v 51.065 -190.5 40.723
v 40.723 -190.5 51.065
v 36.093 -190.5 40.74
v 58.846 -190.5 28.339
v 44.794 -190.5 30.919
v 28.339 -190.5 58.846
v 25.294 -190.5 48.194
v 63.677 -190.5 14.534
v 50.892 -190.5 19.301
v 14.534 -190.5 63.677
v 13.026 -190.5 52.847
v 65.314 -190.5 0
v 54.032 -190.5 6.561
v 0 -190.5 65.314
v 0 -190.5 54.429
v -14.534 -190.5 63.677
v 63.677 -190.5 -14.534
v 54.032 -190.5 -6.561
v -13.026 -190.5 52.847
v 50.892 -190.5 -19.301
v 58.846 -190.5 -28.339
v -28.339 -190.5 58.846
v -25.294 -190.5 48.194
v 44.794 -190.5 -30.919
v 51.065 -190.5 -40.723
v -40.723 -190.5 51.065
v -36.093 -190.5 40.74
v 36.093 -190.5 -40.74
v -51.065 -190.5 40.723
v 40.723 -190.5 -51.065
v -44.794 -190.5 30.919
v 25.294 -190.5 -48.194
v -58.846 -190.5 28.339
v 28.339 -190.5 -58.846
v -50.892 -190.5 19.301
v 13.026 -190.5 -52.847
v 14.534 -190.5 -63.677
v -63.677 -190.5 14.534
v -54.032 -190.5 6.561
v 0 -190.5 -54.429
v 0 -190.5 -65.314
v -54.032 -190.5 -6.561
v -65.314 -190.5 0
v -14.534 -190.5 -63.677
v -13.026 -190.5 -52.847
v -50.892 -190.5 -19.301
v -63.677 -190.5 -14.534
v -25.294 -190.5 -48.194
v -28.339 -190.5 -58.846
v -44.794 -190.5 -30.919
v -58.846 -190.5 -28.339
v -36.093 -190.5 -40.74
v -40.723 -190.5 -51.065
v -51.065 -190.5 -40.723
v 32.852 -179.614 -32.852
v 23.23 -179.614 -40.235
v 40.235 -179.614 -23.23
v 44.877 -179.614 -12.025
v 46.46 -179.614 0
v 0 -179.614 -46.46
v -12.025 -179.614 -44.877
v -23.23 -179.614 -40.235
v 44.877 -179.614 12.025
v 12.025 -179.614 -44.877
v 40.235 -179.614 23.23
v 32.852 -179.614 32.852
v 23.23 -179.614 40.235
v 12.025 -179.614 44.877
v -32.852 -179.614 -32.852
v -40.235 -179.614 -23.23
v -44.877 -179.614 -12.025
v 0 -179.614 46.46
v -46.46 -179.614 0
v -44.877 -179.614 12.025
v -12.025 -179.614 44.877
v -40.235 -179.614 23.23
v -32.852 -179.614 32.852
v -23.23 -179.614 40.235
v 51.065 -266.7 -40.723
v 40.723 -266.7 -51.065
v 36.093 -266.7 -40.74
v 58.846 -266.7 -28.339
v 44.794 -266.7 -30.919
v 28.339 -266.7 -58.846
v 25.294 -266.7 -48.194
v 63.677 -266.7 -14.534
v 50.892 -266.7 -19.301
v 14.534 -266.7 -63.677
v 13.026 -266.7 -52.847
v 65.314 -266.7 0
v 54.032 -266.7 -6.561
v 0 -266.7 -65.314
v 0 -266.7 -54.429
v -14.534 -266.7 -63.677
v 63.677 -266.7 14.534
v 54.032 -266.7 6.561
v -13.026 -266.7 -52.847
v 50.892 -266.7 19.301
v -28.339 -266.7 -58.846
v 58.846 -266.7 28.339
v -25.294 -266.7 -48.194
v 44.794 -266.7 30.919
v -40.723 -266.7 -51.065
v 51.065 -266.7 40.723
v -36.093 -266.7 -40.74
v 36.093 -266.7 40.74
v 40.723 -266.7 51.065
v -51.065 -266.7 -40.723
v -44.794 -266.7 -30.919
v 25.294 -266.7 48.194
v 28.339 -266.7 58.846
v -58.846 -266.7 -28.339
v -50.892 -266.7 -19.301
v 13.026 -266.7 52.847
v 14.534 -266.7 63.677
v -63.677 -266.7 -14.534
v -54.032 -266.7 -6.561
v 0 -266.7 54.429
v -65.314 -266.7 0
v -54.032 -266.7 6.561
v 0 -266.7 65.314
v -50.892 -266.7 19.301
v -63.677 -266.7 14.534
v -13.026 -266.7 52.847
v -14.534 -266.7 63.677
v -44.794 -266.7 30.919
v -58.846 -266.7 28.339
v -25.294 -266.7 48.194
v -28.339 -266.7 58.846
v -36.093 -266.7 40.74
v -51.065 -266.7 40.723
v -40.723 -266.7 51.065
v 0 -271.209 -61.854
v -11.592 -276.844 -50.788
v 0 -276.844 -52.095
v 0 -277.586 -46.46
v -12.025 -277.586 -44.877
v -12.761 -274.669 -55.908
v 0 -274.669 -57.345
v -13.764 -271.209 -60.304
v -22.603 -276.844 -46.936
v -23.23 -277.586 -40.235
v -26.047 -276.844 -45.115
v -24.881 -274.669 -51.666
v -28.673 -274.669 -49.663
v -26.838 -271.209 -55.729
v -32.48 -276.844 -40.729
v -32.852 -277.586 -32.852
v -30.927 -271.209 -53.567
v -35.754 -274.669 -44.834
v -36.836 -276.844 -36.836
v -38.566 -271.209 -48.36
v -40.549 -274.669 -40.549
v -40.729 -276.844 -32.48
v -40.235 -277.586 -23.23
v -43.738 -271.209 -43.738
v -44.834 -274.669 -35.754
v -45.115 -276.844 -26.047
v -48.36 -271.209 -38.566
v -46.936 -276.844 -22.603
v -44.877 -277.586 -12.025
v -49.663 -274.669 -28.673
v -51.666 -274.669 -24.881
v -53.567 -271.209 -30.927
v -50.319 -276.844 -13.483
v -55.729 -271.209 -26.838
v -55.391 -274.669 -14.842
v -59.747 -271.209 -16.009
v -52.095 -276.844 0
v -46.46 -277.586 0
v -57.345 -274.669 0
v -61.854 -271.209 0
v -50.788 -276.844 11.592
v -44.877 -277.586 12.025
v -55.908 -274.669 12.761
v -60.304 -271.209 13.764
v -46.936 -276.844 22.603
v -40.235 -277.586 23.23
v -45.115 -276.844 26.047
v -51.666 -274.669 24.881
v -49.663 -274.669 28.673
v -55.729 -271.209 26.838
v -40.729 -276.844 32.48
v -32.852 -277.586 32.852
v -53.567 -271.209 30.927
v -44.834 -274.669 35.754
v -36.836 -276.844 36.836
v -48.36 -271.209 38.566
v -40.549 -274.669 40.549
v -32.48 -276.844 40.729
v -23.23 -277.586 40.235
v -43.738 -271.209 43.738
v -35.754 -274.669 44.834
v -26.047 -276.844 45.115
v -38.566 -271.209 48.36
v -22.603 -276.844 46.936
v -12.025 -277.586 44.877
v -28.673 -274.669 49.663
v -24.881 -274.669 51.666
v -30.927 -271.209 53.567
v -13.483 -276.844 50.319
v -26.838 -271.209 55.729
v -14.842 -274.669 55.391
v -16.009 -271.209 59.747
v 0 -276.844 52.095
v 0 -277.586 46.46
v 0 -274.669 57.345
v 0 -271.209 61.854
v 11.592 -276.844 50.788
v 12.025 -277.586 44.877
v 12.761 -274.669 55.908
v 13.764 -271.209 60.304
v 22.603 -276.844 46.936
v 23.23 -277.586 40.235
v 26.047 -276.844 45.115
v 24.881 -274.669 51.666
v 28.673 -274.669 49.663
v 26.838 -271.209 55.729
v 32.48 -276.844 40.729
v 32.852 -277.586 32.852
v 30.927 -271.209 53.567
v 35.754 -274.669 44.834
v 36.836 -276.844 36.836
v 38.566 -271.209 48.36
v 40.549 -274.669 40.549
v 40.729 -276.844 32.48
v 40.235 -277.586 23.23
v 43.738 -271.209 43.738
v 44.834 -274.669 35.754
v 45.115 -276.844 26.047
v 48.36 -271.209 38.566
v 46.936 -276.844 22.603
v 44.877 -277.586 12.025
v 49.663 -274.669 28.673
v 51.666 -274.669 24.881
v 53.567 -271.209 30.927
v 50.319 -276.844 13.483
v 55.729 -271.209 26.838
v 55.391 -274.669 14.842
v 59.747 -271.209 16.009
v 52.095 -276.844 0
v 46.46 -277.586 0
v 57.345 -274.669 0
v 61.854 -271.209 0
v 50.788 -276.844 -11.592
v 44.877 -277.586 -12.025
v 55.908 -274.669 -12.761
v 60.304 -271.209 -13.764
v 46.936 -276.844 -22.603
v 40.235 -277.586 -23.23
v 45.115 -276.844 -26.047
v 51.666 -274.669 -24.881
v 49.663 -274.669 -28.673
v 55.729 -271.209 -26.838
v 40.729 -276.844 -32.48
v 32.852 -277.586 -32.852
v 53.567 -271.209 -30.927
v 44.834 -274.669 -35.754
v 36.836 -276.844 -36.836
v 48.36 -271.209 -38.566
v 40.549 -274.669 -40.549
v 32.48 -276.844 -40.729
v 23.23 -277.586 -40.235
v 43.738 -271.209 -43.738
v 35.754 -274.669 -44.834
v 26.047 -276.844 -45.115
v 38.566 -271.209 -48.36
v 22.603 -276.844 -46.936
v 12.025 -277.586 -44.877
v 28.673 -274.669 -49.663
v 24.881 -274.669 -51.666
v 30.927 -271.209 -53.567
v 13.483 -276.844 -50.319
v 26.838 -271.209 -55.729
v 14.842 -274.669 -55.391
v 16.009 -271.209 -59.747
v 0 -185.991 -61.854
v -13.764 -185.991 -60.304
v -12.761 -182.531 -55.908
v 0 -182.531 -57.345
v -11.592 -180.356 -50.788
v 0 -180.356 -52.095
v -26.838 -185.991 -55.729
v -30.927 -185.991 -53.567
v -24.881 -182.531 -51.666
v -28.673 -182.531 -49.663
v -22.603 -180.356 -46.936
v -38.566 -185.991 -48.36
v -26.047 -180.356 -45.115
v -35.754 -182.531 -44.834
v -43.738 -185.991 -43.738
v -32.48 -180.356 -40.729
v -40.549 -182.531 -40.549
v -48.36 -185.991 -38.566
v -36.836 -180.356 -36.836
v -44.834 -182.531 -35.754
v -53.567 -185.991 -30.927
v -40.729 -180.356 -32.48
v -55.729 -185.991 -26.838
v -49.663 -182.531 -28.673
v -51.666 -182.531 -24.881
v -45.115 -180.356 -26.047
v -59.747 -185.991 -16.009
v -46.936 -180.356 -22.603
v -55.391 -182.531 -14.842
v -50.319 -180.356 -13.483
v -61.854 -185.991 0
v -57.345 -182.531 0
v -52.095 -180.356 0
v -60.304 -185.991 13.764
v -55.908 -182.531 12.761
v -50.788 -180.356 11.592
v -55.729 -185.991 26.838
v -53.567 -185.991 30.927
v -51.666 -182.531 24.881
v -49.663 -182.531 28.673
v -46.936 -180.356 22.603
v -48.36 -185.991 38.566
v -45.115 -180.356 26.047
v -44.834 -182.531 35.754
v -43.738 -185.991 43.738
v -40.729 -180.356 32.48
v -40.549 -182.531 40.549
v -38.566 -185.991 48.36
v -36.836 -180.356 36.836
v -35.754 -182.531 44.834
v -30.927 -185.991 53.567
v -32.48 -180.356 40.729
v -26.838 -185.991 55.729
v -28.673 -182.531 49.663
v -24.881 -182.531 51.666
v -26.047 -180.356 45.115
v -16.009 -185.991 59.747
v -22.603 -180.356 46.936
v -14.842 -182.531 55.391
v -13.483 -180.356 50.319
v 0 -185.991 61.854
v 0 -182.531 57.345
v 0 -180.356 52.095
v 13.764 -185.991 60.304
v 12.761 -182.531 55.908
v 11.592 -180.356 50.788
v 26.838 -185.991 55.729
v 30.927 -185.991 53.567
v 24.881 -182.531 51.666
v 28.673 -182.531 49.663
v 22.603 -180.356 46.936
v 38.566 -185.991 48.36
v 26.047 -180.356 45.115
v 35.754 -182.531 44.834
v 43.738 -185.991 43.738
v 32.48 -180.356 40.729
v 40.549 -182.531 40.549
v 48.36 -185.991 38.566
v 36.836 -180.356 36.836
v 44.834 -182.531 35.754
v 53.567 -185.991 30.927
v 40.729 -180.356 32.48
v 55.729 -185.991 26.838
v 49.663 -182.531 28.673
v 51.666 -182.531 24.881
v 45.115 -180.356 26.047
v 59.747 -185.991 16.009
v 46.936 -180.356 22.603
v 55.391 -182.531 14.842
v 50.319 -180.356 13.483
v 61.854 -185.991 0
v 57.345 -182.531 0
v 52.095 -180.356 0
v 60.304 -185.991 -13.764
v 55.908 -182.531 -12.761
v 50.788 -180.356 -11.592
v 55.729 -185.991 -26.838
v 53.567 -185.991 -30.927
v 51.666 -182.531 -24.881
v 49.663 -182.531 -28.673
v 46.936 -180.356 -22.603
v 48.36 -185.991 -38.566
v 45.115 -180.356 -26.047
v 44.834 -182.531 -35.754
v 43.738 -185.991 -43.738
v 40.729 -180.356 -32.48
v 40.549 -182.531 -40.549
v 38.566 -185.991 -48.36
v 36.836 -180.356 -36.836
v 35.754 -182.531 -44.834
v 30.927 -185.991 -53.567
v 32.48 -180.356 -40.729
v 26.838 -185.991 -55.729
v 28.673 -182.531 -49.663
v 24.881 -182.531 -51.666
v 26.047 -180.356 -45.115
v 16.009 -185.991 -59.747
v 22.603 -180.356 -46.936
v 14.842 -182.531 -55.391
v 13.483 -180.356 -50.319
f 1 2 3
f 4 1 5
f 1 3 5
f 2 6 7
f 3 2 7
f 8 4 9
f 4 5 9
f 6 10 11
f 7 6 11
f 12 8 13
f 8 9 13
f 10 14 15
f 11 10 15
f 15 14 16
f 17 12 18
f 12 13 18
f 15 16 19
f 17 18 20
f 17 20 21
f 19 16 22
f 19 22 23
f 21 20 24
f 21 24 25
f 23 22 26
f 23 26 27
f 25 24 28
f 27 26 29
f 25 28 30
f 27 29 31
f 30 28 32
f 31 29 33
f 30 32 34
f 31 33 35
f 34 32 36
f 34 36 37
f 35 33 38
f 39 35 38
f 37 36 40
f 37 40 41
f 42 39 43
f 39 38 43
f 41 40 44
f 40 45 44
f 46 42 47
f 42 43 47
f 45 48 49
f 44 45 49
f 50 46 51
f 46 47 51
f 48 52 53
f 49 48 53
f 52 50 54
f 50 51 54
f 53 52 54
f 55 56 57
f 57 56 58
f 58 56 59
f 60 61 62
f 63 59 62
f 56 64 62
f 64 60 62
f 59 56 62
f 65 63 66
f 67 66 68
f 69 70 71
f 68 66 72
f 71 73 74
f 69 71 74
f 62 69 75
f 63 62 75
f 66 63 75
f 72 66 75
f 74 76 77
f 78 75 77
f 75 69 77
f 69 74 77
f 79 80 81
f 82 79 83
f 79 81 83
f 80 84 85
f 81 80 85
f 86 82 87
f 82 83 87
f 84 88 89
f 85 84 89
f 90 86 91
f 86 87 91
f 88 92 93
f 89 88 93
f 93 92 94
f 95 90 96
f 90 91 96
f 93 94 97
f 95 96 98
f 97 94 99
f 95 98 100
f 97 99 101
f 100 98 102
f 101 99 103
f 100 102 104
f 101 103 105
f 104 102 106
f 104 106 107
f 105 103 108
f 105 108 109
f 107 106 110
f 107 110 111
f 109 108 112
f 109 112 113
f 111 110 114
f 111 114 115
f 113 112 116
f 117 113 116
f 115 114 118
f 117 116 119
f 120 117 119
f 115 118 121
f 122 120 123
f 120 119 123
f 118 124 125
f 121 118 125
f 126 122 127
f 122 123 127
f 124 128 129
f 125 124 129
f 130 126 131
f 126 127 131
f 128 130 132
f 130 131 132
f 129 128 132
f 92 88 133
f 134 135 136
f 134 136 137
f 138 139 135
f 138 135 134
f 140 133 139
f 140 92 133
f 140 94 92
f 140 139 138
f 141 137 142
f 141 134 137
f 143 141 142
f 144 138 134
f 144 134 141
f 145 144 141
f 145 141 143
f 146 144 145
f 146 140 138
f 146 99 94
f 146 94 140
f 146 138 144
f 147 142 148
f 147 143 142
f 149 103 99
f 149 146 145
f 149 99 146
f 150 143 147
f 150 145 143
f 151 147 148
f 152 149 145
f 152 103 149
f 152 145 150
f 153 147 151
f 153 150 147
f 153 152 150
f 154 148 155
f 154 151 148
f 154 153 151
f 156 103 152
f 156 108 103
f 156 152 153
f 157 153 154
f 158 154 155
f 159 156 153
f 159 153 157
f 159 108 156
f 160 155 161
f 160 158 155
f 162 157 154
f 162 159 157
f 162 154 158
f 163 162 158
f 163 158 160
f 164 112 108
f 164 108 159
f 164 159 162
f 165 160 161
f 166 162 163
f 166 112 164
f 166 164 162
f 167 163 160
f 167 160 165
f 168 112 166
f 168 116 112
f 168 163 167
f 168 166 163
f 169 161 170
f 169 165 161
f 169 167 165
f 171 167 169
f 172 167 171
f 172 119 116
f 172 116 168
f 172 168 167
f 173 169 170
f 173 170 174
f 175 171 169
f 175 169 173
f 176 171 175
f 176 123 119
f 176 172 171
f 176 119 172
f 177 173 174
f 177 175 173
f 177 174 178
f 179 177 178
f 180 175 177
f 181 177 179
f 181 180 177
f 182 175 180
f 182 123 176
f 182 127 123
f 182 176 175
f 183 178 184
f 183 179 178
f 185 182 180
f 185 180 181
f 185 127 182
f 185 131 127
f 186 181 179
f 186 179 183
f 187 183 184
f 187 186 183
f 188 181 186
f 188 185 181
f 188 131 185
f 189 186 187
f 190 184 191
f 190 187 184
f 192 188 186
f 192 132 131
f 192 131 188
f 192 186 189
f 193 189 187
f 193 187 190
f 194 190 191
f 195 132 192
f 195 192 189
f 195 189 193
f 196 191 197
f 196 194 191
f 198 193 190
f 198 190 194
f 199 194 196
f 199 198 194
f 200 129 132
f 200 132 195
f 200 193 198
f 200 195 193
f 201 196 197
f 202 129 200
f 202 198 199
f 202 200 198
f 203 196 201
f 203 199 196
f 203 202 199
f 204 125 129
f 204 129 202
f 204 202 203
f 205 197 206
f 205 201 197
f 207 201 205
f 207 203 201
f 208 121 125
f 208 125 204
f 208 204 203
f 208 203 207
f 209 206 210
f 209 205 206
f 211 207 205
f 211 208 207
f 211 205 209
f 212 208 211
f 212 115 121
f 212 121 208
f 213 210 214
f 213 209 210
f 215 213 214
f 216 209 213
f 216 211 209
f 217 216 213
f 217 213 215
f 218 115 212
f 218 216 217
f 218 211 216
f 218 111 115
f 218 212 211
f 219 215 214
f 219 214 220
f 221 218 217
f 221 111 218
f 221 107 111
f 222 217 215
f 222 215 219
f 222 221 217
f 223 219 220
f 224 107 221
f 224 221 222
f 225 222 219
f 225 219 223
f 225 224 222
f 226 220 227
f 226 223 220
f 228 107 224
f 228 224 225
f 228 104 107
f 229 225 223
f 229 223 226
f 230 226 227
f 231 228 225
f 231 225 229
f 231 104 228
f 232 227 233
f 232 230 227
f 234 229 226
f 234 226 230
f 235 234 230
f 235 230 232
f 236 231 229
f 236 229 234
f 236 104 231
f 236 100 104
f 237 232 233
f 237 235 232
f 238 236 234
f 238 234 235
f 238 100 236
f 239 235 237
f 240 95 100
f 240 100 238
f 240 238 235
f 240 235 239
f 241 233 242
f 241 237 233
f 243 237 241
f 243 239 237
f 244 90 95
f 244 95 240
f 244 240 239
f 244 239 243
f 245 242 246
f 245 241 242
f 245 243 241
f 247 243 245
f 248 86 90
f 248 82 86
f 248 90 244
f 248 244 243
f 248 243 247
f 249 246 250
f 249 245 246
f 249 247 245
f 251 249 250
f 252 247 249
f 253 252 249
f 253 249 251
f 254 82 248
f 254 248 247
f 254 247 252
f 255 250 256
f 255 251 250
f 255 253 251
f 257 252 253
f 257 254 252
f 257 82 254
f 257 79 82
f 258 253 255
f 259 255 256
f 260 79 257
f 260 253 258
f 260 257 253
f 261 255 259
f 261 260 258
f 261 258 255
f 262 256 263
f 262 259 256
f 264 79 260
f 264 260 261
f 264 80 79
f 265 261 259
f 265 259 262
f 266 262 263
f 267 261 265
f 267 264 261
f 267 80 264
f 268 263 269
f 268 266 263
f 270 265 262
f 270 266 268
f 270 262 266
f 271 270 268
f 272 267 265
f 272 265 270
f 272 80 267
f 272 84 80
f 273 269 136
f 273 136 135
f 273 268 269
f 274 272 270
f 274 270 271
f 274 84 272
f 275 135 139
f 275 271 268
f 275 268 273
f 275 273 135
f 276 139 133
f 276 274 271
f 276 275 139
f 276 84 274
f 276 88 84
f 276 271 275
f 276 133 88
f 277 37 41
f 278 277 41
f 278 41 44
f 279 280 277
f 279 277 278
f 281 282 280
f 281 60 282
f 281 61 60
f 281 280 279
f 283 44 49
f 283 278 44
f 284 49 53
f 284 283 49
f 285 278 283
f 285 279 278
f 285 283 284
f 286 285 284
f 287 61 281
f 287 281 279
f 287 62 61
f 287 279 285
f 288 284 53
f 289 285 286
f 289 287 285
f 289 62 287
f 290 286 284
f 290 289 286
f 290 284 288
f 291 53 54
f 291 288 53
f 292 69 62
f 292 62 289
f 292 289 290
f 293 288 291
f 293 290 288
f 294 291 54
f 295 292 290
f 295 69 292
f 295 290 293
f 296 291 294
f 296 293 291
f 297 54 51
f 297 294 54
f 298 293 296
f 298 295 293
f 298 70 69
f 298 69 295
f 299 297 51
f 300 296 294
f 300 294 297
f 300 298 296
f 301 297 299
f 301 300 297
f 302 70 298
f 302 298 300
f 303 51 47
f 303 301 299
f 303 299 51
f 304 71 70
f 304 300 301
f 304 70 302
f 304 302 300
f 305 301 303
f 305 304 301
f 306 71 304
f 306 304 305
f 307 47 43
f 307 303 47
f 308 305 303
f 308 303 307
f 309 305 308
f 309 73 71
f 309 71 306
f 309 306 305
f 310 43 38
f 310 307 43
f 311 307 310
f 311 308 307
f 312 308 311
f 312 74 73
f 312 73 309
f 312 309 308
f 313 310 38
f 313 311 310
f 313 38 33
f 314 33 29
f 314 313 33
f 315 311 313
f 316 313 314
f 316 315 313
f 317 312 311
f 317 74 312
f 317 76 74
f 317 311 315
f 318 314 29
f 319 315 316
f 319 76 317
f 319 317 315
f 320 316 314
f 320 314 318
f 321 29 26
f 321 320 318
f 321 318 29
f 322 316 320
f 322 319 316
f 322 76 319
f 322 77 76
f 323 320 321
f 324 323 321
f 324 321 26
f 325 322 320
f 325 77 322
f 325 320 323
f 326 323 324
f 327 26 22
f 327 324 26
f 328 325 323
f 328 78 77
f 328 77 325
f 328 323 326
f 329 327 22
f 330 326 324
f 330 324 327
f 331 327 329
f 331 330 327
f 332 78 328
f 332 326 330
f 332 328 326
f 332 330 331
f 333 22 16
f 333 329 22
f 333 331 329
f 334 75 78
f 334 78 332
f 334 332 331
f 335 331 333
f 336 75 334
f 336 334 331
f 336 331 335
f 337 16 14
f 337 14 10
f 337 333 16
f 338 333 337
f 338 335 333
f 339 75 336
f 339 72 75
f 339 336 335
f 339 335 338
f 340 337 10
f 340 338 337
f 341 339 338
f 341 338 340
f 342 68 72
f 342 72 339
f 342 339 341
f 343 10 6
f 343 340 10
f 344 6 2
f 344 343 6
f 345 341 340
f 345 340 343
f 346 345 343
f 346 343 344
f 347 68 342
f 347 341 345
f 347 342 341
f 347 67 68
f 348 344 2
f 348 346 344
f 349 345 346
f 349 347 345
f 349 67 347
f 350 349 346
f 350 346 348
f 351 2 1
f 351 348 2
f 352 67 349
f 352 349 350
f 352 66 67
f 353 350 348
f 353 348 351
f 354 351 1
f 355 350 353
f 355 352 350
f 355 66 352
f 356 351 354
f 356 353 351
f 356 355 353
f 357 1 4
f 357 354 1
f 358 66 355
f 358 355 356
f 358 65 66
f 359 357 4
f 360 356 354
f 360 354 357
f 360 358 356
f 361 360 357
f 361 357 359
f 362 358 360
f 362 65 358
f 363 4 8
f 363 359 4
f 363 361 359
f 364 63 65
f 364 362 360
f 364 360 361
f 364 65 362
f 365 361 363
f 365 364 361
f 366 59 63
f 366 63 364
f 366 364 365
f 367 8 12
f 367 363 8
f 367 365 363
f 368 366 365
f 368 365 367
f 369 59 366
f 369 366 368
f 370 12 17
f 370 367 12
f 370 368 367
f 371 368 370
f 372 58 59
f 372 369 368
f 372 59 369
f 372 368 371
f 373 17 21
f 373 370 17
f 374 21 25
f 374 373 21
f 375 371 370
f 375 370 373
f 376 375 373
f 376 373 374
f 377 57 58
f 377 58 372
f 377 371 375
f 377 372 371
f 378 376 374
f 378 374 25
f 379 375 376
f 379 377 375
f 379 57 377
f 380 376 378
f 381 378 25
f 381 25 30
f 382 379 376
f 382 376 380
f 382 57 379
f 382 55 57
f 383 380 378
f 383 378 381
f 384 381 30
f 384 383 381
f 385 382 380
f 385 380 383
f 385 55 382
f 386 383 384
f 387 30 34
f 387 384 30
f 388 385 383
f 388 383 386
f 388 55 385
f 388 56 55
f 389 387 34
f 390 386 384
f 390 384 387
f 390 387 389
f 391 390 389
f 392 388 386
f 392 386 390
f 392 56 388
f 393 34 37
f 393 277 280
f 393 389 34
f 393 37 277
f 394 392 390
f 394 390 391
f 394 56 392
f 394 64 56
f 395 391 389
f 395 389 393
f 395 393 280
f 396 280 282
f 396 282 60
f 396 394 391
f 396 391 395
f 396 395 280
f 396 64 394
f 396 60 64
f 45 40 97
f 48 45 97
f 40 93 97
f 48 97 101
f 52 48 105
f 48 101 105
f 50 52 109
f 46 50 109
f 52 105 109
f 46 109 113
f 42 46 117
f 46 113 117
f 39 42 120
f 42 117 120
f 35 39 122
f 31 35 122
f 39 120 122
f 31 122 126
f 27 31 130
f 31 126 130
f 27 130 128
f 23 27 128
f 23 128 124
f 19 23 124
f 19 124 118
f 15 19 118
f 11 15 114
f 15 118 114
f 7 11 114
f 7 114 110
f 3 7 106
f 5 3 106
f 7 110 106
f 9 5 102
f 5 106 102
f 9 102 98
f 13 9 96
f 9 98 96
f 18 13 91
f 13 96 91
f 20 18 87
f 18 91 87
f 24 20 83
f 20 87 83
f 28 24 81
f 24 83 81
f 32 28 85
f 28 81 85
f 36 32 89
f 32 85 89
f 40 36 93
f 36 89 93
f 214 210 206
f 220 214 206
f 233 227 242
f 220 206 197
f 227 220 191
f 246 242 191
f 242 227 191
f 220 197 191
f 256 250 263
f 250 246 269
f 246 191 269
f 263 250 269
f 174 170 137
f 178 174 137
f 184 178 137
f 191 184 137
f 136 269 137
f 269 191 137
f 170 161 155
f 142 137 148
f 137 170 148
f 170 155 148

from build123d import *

# Parameters (mm, degrees)
FILLET1_R    = 101.6
SCALE1_SCALE = 0.214285714


with BuildPart() as part:
    # Sketch2 → Revolve1 (revolve)
    with BuildSketch(Plane.XY, mode=Mode.PRIVATE) as revolve1_sk:
        Polygon((0, 0), (304.8, 0), (304.8, -50.8), (254, -50.8), (254, -406.4), (304.8, -406.4), (304.8, -457.2), (0, -457.2), align=None)
    revolve(revolve1_sk.sketch.rotate(Axis((0, -457.2, 0), (0, 1, 0)), 90), axis=Axis((0, -457.2, 0), (0, 1, 0)))

    # Fillet1
    # the kernel refuses this fillet: 101.6 mm, written as the material it takes off along each edge
    with BuildSketch(Plane(origin=(0, -457.2, 0), x_dir=(0, 0, -1), z_dir=(1, 0, 0))) as fillet1_piece_1:
        with BuildLine():
            CenterArc((216.811818975, 101.6), FILLET1_R, 270, 60)
            Line((216.811818975, 0), (216.811818975, -2.032))
            Line((216.811818975, -2.032), (304.8, -2.032))
            Line((304.8, -2.032), (306.832, 0))
            ThreePointArc((306.832, 0), (306.832, 25.4), (306.55976362, 49.784))
            Line((306.55976362, 49.784), (304.8, 50.8))
        make_face()
    revolve(axis=Axis((0, -457.2, 0), (0, 1, 0)), mode=Mode.SUBTRACT)
    with BuildSketch(Plane(origin=(0, 0, 0), x_dir=(0, 0, -1), z_dir=(1, 0, 0))) as fillet1_piece_2:
        with BuildLine():
            CenterArc((216.811818975, -101.6), FILLET1_R, 30, 60)
            Line((304.8, -50.8), (306.55976362, -49.784))
            ThreePointArc((306.55976362, -49.784), (306.832, -25.4), (306.832, 0))
            Line((306.832, 0), (304.8, 2.032))
            Line((304.8, 2.032), (216.811818975, 2.032))
            Line((216.811818975, 2.032), (216.811818975, 0))
        make_face()
    revolve(axis=Axis((0, 0, 0), (0, 1, 0)), mode=Mode.SUBTRACT)


with BuildPart() as part_1:
    # Scale1: scaled about (0, -228.6, 0)
    add(part.part.scale(SCALE1_SCALE).moved(Location((0, -179.614285714, 0))))


solid = part_1.part
